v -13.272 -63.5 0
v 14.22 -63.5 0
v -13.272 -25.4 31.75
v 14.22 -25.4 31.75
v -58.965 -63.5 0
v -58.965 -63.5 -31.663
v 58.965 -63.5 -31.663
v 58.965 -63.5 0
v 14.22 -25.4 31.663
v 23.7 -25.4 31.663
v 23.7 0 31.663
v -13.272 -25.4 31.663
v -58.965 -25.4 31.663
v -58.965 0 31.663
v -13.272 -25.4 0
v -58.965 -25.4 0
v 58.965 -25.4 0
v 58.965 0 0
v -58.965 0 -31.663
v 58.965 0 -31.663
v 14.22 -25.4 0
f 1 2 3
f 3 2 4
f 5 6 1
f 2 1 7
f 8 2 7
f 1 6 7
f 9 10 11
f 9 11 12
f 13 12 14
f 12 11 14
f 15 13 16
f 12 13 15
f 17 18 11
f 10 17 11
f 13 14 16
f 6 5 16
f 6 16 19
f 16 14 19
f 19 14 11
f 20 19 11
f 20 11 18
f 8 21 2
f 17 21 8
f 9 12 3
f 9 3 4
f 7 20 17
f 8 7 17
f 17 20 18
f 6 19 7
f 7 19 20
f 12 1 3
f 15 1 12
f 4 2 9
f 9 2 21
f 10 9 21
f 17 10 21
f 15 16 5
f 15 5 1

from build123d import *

# Parameters (mm, degrees)
F0_W     = 117.9294288158
F0_H     = 31.6627249122
F1_DEPTH = 63.5
F2_DEPTH = 25.4
F3_W     = 27.4915890768
F3_H     = 38.1
F4_DEPTH = 31.75
F6_DEPTH = 73.1855023111


with BuildPart() as f1:
    # F0 (on Front) → F1 (new body)
    with BuildSketch(Plane.XZ):
        with Locations((0, -15.8313624561)):
            Rectangle(F0_W, F0_H)
    extrude(amount=F1_DEPTH)

    # F0 (on Front) → F2 (join)
    with BuildSketch(Plane.XZ):
        Polygon((58.9647144079, 0), (23.699644953, 31.6627249122), (-58.9647144079, 31.6627249122), (-58.9647144079, 0), align=None)
    extrude(amount=F2_DEPTH)

    # F3 (on face) → F4 (join)
    with BuildSketch(Plane.XY):
        with Locations((0.4739933647, -44.45)):
            Rectangle(F3_W, F3_H)
    extrude(amount=F4_DEPTH)

    # F5 (on face) → F6 (cut, through all)
    with BuildSketch(Plane.YZ.offset(14.2197879031)):
        Polygon((-63.5, 0), (-25.4, 31.75), (-63.5, 31.75), align=None)
    extrude(amount=-F6_DEPTH, mode=Mode.SUBTRACT)


solid = f1.part
